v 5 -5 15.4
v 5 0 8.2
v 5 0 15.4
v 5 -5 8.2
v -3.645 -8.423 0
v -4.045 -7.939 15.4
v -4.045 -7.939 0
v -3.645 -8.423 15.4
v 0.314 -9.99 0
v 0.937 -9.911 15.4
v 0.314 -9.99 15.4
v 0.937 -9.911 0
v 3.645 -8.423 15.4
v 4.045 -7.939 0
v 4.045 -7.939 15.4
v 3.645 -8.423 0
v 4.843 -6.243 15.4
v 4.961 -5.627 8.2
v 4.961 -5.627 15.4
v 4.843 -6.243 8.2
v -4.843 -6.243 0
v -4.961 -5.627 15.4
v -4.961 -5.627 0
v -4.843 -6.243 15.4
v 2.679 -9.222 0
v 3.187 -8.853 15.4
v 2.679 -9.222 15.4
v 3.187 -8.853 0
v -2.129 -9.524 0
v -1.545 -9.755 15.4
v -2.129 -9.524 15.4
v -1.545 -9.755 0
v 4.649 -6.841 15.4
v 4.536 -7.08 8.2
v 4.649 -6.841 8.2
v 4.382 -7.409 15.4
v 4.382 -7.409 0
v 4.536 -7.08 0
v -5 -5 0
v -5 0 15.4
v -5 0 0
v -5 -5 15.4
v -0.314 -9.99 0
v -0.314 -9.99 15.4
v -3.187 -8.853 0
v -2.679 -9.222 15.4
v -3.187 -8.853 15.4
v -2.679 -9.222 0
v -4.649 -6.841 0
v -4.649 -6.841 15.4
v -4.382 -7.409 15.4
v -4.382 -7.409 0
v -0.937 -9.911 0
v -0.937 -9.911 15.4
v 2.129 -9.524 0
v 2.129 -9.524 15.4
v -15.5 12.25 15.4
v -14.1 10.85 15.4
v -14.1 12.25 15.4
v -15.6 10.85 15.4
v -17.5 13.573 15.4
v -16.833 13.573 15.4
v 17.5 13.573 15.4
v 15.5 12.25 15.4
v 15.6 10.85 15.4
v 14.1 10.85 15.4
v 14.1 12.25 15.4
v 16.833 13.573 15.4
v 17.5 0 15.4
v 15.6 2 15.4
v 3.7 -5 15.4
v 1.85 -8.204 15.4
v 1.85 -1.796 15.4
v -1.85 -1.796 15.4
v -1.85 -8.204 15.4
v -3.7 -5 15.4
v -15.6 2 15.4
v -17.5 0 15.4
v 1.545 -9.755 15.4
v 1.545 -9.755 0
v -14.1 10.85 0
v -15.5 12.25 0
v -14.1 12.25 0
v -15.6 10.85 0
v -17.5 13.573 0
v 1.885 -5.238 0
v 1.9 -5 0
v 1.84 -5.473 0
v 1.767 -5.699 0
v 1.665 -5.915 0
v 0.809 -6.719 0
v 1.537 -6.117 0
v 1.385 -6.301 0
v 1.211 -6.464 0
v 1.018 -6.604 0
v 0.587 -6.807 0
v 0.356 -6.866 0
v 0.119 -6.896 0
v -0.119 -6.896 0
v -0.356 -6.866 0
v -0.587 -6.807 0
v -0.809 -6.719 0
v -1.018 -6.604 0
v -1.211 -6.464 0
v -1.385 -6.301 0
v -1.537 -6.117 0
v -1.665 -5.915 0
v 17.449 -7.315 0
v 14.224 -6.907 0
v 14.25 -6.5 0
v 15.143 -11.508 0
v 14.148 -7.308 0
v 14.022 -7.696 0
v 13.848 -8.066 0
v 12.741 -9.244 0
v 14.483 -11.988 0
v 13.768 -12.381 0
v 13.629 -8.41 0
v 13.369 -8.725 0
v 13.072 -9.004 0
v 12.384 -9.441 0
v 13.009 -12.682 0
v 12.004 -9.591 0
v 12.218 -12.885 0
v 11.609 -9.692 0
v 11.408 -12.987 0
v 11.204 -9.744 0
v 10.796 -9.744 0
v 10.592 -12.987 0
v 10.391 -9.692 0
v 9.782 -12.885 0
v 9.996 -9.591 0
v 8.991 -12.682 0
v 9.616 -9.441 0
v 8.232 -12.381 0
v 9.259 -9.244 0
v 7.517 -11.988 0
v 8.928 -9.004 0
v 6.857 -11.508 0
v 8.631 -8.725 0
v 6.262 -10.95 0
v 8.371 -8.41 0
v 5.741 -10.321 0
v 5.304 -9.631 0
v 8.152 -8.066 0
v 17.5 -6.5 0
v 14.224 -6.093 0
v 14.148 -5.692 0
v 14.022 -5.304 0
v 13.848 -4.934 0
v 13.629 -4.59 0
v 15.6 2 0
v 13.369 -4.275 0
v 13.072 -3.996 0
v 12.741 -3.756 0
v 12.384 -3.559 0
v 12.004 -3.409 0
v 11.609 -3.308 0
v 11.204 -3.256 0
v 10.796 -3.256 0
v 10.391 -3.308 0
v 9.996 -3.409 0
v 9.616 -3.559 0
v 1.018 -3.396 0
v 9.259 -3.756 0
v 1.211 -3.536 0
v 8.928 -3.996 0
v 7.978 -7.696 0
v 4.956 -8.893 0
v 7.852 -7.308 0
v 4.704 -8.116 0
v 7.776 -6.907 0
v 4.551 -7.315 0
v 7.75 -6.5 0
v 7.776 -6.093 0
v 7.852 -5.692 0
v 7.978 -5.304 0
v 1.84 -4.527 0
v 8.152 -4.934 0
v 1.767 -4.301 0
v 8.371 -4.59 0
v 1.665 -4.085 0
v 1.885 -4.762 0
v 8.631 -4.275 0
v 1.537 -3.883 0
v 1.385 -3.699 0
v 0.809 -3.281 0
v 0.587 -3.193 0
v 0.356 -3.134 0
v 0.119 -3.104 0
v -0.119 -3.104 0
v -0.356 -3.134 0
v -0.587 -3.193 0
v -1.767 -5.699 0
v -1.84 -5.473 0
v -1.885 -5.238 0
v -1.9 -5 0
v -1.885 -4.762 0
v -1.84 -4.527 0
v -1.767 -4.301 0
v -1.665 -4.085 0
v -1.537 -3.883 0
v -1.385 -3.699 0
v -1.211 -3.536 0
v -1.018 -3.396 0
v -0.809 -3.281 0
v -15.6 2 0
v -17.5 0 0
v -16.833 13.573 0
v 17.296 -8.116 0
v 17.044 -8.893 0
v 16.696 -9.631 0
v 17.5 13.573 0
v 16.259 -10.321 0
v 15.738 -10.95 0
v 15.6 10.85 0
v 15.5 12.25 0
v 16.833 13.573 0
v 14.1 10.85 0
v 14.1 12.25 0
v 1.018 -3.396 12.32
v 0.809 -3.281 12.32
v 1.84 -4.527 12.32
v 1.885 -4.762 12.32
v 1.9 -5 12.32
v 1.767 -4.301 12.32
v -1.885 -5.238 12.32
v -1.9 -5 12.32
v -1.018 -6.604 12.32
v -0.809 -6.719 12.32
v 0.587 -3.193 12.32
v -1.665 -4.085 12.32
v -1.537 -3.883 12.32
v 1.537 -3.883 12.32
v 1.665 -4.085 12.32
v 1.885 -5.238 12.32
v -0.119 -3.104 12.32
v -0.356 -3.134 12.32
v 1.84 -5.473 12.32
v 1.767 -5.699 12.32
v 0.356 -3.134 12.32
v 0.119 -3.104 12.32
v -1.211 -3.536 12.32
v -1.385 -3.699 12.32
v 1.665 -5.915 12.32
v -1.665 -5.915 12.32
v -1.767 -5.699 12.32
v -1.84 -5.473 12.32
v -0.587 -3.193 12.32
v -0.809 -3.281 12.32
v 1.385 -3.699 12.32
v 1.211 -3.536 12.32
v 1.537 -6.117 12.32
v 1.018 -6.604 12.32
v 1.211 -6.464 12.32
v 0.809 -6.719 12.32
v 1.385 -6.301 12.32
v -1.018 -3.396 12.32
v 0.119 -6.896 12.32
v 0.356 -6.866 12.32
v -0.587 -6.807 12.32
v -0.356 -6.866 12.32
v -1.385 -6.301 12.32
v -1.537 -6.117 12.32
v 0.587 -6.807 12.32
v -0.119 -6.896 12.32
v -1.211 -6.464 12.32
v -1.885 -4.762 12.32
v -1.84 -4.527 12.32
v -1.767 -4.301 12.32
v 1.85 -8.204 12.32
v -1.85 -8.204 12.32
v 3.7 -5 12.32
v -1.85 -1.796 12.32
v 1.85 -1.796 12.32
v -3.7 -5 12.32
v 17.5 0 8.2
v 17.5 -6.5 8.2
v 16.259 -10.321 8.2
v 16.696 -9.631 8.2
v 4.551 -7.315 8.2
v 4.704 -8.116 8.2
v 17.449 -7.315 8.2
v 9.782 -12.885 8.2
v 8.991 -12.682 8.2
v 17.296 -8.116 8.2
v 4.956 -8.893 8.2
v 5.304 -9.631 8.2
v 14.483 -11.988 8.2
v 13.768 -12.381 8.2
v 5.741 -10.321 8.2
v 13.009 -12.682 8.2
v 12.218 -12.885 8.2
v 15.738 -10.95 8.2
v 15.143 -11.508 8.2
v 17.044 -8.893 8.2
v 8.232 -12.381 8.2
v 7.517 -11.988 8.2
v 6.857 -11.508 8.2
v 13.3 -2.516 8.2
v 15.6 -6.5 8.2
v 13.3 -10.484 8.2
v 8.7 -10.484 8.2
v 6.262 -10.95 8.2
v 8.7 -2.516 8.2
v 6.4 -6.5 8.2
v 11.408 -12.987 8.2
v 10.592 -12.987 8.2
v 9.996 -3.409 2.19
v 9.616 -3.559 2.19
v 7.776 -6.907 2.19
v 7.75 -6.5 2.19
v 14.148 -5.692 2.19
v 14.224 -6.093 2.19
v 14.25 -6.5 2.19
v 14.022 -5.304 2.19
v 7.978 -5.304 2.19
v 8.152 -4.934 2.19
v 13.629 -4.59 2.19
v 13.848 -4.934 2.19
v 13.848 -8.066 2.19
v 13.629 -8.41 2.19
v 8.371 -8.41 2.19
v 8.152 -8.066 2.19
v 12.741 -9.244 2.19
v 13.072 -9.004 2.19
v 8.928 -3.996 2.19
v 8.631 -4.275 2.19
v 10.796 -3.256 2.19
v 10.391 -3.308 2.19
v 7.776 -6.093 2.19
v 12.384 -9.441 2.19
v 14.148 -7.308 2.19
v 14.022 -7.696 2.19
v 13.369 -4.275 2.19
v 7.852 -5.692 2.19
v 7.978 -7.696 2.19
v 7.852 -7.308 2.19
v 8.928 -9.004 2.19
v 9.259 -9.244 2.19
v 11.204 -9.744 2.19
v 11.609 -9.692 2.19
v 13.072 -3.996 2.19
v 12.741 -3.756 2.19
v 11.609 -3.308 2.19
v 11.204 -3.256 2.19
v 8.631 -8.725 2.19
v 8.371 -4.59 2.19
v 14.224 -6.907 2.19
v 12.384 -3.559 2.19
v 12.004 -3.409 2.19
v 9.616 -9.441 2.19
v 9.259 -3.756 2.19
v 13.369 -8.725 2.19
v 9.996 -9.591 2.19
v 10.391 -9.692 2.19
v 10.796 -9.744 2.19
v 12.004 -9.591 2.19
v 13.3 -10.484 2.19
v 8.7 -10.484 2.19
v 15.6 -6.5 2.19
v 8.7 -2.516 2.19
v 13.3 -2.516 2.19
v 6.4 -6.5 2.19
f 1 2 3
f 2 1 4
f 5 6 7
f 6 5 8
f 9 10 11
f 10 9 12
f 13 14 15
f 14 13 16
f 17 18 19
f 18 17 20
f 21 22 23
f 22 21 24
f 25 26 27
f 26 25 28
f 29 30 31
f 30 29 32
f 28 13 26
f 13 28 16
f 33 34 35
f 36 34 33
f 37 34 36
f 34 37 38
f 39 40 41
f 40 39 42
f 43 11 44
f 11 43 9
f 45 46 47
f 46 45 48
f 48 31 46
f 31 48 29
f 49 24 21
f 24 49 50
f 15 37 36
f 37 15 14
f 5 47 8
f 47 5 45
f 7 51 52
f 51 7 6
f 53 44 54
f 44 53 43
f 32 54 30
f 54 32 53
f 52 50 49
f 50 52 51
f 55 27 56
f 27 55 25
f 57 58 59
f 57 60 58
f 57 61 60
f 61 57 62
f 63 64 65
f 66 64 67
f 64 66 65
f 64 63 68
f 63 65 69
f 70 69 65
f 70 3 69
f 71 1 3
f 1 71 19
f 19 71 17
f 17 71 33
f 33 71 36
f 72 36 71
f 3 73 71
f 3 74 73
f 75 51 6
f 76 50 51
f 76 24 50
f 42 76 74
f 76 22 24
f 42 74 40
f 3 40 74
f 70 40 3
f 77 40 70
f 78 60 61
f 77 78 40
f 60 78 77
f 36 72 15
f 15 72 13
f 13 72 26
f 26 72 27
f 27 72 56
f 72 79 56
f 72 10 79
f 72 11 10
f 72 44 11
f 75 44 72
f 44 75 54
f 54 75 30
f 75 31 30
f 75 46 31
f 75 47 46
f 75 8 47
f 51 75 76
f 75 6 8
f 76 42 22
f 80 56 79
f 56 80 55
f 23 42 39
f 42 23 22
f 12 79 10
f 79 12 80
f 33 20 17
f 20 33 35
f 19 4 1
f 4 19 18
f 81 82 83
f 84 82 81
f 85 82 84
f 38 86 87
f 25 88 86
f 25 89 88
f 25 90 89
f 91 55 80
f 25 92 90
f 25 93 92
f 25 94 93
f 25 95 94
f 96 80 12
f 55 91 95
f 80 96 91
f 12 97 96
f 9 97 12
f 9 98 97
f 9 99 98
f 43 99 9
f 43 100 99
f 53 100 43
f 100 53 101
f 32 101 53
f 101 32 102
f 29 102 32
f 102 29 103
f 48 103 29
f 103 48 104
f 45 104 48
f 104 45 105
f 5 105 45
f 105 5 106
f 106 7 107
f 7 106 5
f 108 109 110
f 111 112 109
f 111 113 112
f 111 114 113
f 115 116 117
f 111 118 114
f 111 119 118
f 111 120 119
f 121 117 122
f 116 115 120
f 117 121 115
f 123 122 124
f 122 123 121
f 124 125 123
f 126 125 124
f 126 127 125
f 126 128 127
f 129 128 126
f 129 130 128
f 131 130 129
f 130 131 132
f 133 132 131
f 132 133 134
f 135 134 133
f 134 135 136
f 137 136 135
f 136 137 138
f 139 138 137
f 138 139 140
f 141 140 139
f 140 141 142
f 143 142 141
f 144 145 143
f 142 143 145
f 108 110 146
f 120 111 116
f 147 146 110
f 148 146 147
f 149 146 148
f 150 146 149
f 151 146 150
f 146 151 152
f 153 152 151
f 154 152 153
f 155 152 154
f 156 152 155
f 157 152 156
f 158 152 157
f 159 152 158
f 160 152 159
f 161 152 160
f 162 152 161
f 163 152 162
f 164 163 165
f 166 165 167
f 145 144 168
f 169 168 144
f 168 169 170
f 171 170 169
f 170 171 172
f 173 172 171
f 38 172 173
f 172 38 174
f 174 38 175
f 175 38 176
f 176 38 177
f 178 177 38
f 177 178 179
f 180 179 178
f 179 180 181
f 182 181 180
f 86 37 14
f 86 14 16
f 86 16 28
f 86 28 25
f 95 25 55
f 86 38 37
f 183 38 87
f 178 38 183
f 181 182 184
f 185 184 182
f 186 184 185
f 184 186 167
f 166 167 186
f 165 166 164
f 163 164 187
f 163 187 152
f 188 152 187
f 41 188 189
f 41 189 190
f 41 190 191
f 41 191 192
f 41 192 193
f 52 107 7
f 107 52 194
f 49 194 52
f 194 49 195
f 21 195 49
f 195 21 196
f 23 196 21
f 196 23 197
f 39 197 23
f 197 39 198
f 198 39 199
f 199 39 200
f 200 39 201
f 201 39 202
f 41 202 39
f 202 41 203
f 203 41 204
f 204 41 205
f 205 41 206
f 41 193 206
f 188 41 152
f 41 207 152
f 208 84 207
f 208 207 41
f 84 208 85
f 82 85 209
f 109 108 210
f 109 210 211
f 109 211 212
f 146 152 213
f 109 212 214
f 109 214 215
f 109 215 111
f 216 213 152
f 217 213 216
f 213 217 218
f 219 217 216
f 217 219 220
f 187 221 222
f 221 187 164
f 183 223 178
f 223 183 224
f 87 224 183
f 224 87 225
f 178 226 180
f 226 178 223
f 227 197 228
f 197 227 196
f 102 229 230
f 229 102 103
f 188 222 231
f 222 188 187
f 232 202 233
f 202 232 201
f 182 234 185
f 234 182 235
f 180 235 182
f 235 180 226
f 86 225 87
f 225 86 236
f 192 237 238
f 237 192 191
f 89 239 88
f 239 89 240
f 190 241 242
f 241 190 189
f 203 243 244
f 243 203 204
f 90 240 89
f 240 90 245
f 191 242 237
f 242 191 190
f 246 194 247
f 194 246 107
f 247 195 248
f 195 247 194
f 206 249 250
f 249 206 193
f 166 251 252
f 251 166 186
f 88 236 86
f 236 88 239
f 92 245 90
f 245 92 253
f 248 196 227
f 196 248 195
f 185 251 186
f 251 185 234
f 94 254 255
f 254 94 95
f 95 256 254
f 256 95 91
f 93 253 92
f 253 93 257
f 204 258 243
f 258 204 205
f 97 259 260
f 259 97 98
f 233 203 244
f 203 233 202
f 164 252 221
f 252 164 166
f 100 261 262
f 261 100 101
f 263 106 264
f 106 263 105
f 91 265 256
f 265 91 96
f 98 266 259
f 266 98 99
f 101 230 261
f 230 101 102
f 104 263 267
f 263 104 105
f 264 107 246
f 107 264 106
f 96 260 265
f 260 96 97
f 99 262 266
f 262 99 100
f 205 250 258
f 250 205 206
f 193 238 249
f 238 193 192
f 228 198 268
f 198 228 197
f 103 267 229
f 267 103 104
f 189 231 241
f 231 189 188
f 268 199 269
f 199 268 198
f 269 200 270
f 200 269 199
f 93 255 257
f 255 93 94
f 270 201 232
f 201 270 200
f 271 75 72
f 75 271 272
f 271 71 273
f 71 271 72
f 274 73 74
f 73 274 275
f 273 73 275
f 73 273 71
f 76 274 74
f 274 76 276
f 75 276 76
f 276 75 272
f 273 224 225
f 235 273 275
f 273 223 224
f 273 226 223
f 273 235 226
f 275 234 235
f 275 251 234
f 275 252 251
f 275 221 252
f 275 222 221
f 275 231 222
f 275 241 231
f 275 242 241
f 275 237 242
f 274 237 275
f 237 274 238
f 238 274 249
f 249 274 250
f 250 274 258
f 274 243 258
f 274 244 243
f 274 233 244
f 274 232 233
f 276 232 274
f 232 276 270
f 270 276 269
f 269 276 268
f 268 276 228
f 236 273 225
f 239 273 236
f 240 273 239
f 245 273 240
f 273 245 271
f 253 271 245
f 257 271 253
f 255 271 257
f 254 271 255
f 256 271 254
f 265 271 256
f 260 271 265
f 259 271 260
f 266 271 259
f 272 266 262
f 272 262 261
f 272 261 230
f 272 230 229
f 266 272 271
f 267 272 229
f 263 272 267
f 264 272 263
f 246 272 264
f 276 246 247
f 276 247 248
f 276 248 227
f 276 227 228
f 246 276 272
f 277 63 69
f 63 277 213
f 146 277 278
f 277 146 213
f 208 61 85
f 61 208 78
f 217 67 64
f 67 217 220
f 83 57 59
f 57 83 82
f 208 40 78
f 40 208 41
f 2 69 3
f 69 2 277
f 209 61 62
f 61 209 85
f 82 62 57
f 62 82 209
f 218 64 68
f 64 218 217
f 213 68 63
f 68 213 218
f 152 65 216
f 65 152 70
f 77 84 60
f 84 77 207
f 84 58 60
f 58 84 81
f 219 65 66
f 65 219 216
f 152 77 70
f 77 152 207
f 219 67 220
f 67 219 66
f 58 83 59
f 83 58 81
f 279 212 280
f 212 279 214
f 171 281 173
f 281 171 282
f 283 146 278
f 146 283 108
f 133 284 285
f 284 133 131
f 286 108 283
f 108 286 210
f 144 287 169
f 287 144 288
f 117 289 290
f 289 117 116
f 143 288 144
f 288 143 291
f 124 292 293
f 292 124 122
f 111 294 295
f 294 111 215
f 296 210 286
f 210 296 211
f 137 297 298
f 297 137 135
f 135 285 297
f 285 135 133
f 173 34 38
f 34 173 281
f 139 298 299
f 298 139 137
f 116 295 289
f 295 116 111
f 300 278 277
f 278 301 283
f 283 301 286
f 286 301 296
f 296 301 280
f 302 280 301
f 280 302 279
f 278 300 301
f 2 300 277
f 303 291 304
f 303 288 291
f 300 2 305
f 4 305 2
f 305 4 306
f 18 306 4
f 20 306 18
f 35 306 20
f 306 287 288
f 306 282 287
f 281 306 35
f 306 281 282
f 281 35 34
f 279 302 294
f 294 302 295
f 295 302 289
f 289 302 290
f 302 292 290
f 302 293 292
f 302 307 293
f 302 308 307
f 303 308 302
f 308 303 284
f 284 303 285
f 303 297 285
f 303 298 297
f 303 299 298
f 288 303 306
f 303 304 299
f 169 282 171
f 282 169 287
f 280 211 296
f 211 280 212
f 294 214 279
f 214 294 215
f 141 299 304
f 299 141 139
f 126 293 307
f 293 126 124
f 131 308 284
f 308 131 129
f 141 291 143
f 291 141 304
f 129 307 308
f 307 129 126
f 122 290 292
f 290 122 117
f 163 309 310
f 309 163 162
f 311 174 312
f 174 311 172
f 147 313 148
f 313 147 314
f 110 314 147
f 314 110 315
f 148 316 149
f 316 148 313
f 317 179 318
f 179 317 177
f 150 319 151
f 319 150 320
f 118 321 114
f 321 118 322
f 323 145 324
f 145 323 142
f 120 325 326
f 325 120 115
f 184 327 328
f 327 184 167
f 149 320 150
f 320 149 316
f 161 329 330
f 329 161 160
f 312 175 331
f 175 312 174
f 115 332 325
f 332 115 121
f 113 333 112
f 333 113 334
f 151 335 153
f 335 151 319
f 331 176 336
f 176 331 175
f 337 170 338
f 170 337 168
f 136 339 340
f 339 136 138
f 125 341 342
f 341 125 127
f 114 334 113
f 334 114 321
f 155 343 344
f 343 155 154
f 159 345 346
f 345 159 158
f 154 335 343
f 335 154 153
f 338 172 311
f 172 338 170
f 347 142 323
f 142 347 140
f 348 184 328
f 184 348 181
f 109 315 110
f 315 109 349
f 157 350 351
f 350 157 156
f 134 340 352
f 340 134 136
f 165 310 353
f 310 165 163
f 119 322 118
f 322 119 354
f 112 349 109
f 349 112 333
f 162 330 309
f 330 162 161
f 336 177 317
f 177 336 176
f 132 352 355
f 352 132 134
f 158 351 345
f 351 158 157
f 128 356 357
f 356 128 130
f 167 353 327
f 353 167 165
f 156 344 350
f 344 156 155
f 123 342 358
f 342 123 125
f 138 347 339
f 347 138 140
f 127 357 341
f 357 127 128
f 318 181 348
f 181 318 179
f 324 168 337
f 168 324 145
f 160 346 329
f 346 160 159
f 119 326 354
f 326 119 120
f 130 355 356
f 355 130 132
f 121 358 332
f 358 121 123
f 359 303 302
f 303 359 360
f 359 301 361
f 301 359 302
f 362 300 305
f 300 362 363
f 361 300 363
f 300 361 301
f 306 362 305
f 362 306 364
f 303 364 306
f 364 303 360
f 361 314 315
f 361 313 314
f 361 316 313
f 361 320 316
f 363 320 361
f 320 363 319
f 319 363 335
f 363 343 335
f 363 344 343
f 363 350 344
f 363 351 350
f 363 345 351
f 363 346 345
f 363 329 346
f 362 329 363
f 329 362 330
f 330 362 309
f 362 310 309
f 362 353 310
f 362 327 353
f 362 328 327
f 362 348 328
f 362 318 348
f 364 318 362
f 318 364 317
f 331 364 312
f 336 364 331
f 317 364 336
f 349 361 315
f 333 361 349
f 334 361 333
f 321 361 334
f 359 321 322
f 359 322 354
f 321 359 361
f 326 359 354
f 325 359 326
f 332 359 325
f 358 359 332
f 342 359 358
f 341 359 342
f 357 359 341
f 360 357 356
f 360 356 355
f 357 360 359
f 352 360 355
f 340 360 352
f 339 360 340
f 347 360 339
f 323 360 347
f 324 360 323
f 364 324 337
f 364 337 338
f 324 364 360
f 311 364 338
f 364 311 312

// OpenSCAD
// file: esp32_cam_mb_enclosure_common.scad
// common values for esp32_cam_mb_enclosure

boxFrontPanelThickness=2.25;
boxSideWallThickness=1.5;

backPlateWallThickness=1.5;

boxInnerHeight=41;
boxInnerWidth=28;
boxInnerDepth=21;

mountClipSlotHeight=15.5;  // positioned relative to boxInnerHeight
mountClipSlotDepth=2; // positioned relative to boxInnerDepth
mountClipSlotHeightPosition=17;  // bottom of the slot
mountClipSlotInsetFromBack=7; // rearmost edge


// calculated
boxOuterWidth=boxInnerWidth+boxSideWallThickness*2;
boxOuterHeight=boxInnerHeight+boxSideWallThickness*2;
boxOuterDepth=boxInnerDepth+boxFrontPanelThickness;

usbAccessHoleWidth=11;  // centered relative to boxInnerWidth

resetButtonAccessHoleHeight=6;

mountClipHingeOuterDia=10;
mountClipHingeInnerDia=3.8;

/*
 * The inner dia of the mount-clip hinge is 3.8, so...
 * Asked https://www.perplexity.ai : "what is the outer diameter of an m4 nut"
 * and it pulled info from boltdepot's web site to yield the answer 7.2mm.
 * The value here has a bit of margin to avoid fitting too tightly.
 */
m4NutCountersinkDia=7.4;
// main file
// esp32cam_mb_enclosure - clip-mount

include <esp32_cam_mb_enclosure_common.scad>

mountClipWallThickness=2;
mountClipSlotInsertDepth=boxSideWallThickness-0.1;  // how deep into the slot the clip goes

mountClipInsertThicknessTolerance=0.05;  // how much to shave off the insert thickness for fit.
mountClipInsertThickness=mountClipSlotDepth-mountClipInsertThicknessTolerance*2;

mountClipOuterWidth=boxOuterWidth+mountClipWallThickness*2;

// This accounts for slight variations in sliced model for 3d printer to line things
// up when the printed part is slightly off because of rounding to position lines
insertInsetFromBackAdjust=0.3;

// how much extra room to leave on either side of the box, inside the sides of the clip
mountClipSideTolerance=0.1;

antennaMountPlateThickness=2.2;
antennaMountHoleDia=6.5;
antennaMountPlateOuterDia=13;
antennaMountPlateHingeOverlap=0.5;
antennaCountersinkDepth=6;
antennaCountersinkHexDia=9.2;

overlap=0.01;
$fn=50;

// calculated

// This makes the entire clip slightly shorter so it will fit top to bottom
slotInsertHeight=mountClipSlotHeight-mountClipInsertThicknessTolerance*2;

// accommodates backplate thickness and slot insert thickness with inner tolerance amount only
mountClipOuterDepth=mountClipWallThickness + backPlateWallThickness + mountClipSlotInsetFromBack
        + mountClipInsertThicknessTolerance + mountClipSlotInsertDepth + insertInsetFromBackAdjust;

innerBoxDepth=backPlateWallThickness + mountClipSlotInsetFromBack
        + mountClipInsertThicknessTolerance + insertInsetFromBackAdjust;
//backPlateWallThickness+mountClipSlotInsetFromBack        

hingeClip();
// check symmetry
* translate([0,0,overlap])
    mirror([1,0,0])
        color([1,0,0])
            hingeClip();
// compare w/ prev
* color([1,0,0]) import("esp32_cam_mb_enclosure_clip_mount_proto01.stl", convexity=3);            
module hingeClip() {
    union() {
        // hinge part
        difference() {
            hull() {
                translate([0,-mountClipHingeOuterDia/2,0])
                    cylinder(d=mountClipHingeOuterDia, h=slotInsertHeight);

                translate([-mountClipHingeOuterDia/2,0,0])
                    cube([mountClipHingeOuterDia,overlap,slotInsertHeight]);
            }
            // hinge hole
            translate([0,-mountClipHingeOuterDia/2,-overlap])
                cylinder(d=mountClipHingeInnerDia, h=slotInsertHeight+overlap*2);
            // nut countersink
            translate([0,-mountClipHingeOuterDia/2,slotInsertHeight*4/5])
                cylinder(d=m4NutCountersinkDia, h=slotInsertHeight/5+overlap, $fn=6);
        }
        // clip part
        removalTabDepth=mountClipWallThickness*2/3;
        removalTabTipWidth=mountClipWallThickness/3;
        translate([-mountClipOuterWidth/2,0,0]) // center on y-axis
            difference() {
                union() {
                    cube([mountClipOuterWidth,mountClipOuterDepth,slotInsertHeight]);
                    // removal tab left
                    translate([0,mountClipOuterDepth-overlap,0])
                    hull() {
                        cube([mountClipWallThickness,overlap,slotInsertHeight]);
                        translate([0,removalTabDepth-overlap,0])
                            cube([removalTabTipWidth,overlap,slotInsertHeight]);
                    }
                    // removal tab right
                    translate([mountClipWallThickness+boxOuterWidth,mountClipOuterDepth-overlap,0])
                    hull() {
                        cube([mountClipWallThickness,overlap,slotInsertHeight]);
                        translate([mountClipWallThickness-removalTabTipWidth,removalTabDepth-overlap,0])
                            cube([removalTabTipWidth,overlap,slotInsertHeight]);
                    }
                }
                // cutout wide part (that goes around the box)
                translate([mountClipWallThickness-mountClipSideTolerance,mountClipWallThickness,-overlap])
                    cube([boxOuterWidth+mountClipSideTolerance*2,innerBoxDepth,slotInsertHeight+overlap*2]);
                // cutout the narrow part (between the inserts)    
                translate([mountClipWallThickness+mountClipSlotInsertDepth,
                        mountClipOuterDepth-mountClipInsertThickness-overlap,
                        -overlap])
                     cube([boxOuterWidth-mountClipSlotInsertDepth*2,mountClipInsertThickness+overlap*2,slotInsertHeight+overlap*2]);
            }
        // antenna mount plate part
        translate([mountClipHingeOuterDia/2+antennaMountPlateOuterDia/2-antennaMountPlateHingeOverlap,0,0])
            difference() {
                hull() {
                    translate([0,-antennaMountPlateOuterDia/2,0])
                        cylinder(d=antennaMountPlateOuterDia, h=antennaMountPlateThickness+antennaCountersinkDepth);

                    translate([-antennaMountPlateOuterDia/2,0,0])
                        cube([antennaMountPlateOuterDia,overlap,antennaMountPlateThickness+antennaCountersinkDepth]);
                }
                // antenna connector hole
                translate([0,-antennaMountPlateOuterDia/2,-overlap])
                    cylinder(d=antennaMountHoleDia, h=antennaMountPlateThickness+overlap*2);
                // antenna connector countersink
                translate([0,-antennaMountPlateOuterDia/2,antennaMountPlateThickness-overlap])
                    cylinder(d=antennaCountersinkHexDia, h=antennaCountersinkDepth+overlap*2, $fn=6);
            }
               
    }
}
